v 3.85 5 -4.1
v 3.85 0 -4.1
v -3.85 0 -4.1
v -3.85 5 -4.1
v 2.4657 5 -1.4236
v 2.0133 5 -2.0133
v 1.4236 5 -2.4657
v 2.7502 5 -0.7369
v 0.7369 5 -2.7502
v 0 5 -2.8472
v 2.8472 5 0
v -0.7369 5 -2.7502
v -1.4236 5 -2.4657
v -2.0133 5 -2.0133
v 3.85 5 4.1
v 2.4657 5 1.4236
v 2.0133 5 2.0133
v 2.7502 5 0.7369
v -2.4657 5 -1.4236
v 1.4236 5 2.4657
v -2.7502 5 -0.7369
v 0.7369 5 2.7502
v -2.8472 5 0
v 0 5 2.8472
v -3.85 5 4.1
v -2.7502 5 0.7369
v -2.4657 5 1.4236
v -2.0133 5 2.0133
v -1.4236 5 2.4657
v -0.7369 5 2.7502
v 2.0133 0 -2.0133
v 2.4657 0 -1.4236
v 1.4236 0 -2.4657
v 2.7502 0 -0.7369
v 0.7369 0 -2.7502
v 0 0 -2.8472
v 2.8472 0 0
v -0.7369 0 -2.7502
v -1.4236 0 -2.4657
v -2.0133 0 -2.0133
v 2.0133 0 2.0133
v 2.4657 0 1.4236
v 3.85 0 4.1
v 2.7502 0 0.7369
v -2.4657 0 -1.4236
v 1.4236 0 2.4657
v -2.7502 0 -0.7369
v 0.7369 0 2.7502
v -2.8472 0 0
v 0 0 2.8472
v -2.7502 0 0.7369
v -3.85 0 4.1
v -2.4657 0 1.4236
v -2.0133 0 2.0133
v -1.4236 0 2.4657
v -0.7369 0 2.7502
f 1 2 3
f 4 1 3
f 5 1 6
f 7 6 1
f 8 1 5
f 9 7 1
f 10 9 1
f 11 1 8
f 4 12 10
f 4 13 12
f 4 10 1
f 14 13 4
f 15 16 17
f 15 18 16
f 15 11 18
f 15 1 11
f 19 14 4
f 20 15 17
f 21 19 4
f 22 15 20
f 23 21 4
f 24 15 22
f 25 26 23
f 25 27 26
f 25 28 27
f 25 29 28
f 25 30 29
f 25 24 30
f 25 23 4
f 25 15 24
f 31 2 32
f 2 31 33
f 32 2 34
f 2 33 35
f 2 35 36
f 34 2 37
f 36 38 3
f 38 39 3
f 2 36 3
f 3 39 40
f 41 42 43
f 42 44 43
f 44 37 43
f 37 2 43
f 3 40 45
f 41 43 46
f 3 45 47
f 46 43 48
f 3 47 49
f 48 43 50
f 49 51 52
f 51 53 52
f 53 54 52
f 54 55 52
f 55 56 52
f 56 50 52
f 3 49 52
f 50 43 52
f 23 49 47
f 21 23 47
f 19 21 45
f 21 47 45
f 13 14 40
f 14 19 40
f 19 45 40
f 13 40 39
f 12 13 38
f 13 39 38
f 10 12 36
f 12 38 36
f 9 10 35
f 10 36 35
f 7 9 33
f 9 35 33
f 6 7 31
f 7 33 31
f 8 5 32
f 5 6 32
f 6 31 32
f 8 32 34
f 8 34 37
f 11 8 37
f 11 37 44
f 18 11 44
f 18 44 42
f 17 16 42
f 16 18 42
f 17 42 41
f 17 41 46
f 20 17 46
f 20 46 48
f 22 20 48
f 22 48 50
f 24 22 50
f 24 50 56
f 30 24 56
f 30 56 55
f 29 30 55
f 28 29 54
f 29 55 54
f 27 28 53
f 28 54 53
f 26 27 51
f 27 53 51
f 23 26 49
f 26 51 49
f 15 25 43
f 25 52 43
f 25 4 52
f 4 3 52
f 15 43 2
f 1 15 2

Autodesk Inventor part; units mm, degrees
ref_plane "YZ Plane" through (0, 0, 0) normal (1, 0, 0) x (0, 1, 0)
ref_plane "XZ Plane" through (0, 0, 0) normal (0, 1, 0) x (-1, 0, 0)
ref_plane "XY Plane" through (0, 0, 0) normal (0, 0, 1) x (1, 0, 0)
sketch "Sketch1" plane through (0, 0, 0) normal (0, 1, 0) x (-1, 0, 0)
  line L0 (3.85, 4.1) -> (-3.85, 4.1)
  line L1 (-3.85, 4.1) -> (-3.85, -4.1)
  line L2 (-3.85, -4.1) -> (3.85, -4.1)
  line L3 (3.85, -4.1) -> (3.85, 4.1)
  line L4 (3.85, 4.1) -> (-3.85, -4.1) construction
  line L5 (-3.85, 4.1) -> (3.85, -4.1) construction
  circle A0 centre (0, 0) radius 2.8472
  dimension "d0" = 7.7
  dimension "d1" = 8.2
extrude "Extrusion1" add sketch "Sketch1" along normal blind 5
properties part number "00_Lens_Iphone_5s"
